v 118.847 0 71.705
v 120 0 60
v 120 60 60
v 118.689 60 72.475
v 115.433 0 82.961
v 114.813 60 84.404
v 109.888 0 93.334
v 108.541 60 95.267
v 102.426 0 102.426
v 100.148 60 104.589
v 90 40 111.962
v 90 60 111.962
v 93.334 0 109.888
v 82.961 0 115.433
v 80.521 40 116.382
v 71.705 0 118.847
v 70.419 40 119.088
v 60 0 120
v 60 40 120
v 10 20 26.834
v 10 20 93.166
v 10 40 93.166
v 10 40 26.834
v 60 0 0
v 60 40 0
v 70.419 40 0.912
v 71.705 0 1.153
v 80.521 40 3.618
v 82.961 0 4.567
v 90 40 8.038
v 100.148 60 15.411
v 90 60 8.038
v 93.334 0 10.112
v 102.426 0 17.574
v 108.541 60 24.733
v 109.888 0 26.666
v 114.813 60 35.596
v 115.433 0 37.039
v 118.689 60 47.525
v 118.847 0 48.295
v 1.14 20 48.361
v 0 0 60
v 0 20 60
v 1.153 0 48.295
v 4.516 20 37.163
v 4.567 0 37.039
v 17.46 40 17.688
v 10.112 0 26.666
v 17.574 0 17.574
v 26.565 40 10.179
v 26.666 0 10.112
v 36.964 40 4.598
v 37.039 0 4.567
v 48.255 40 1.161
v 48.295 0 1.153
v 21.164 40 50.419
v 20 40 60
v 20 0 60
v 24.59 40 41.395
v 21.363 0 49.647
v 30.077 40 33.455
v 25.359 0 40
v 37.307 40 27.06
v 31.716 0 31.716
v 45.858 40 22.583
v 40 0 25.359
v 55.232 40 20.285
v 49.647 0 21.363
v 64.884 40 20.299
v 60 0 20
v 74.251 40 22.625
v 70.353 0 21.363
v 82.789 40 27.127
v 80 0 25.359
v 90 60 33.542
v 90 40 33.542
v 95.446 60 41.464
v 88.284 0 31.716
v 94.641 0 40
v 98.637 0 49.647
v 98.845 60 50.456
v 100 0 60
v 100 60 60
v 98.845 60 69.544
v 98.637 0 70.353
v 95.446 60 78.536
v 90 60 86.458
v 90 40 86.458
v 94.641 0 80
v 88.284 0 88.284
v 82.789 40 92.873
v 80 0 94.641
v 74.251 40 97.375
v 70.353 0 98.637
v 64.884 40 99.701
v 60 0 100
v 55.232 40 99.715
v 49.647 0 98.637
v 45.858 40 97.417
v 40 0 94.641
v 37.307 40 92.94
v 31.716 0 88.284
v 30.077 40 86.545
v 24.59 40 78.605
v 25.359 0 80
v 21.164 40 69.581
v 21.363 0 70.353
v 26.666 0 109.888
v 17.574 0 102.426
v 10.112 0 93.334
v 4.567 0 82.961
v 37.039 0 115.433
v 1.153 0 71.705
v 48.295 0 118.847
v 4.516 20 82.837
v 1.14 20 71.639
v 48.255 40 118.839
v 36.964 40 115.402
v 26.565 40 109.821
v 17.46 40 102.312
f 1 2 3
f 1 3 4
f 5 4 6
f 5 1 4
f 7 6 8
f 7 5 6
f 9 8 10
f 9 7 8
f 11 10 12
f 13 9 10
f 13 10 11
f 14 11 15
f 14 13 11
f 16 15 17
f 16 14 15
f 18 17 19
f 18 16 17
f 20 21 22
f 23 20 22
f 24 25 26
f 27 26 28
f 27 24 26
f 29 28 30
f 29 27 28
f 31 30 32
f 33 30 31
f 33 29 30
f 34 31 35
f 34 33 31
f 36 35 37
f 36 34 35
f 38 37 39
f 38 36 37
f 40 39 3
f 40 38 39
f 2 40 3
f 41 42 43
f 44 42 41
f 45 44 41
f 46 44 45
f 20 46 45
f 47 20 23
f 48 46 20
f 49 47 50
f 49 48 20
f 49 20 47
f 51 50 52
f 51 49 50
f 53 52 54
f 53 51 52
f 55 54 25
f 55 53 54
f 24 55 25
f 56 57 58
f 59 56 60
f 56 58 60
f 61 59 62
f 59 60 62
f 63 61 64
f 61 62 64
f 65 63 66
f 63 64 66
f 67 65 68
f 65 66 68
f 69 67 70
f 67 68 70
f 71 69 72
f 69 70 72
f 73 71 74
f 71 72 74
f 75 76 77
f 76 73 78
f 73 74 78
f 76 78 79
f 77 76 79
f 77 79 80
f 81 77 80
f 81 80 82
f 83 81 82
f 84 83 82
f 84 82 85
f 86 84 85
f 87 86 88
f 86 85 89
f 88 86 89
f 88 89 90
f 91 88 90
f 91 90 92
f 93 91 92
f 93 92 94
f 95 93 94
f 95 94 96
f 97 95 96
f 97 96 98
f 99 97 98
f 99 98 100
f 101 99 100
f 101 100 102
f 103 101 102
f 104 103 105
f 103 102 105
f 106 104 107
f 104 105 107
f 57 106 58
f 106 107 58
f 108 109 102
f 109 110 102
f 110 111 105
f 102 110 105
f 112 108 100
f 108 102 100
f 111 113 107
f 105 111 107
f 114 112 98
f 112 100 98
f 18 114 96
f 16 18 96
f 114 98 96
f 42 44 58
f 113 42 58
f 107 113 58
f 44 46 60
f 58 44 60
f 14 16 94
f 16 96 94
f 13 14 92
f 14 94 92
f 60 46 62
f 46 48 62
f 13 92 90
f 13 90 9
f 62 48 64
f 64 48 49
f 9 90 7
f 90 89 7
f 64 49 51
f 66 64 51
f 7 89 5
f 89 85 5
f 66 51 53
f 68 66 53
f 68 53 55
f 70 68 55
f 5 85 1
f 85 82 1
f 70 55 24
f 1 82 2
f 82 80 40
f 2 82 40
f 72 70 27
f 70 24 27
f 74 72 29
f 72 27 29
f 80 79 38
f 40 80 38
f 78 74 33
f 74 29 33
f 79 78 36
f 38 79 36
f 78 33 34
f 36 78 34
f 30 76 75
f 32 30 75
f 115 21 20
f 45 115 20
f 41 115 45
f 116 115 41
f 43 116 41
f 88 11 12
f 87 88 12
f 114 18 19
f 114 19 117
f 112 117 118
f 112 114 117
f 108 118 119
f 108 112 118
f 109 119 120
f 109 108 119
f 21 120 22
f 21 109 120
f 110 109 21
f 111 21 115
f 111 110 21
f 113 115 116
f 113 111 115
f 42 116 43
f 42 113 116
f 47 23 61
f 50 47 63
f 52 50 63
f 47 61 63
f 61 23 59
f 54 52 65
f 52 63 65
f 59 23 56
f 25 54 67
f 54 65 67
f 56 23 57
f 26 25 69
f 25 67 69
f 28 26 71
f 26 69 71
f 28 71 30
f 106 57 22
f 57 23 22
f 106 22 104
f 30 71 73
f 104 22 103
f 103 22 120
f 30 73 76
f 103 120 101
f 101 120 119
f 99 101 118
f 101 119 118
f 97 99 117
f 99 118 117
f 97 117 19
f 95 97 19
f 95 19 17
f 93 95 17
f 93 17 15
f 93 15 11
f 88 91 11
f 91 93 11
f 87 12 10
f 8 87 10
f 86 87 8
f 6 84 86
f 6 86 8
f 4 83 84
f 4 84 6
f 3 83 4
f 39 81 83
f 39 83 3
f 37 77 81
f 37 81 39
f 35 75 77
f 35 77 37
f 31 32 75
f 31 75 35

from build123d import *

# Parameters (mm, degrees)
SKETCH1_W           = 120
SKETCH1_H           = 60
BOSS_EXTRUDE1_DEPTH = 120
CUT_EXTRUDE1_DEPTH  = 120
CUT_EXTRUDE2_DEPTH  = 120
SKETCH5_R           = 40
CUT_EXTRUDE3_DEPTH  = 120


with BuildPart() as part:
    # Sketch1 → Boss-Extrude1 (new body)
    with BuildSketch(Plane.XY):
        with Locations((60, 30)):
            Rectangle(SKETCH1_W, SKETCH1_H)
    extrude(amount=BOSS_EXTRUDE1_DEPTH)

    # Sketch2 → Cut-Extrude1 (cut)
    with BuildSketch(Plane.XY.offset(120)):
        Polygon((0, 60), (0, 20), (10, 20), (10, 40), (90, 40), (90, 60), align=None)
    extrude(amount=-CUT_EXTRUDE1_DEPTH, mode=Mode.SUBTRACT)

    # Sketch3 → Cut-Extrude2 (cut)
    with BuildSketch(Plane(origin=(0, 0, 0), x_dir=(1, 0, 0), z_dir=(0, 1, 0))):
        with BuildLine():
            Line((120, 0), (60, 0))
            ThreePointArc((60, 0), (102.426406871, -17.573593129), (120, -60))
            Line((120, -60), (120, 0))
        make_face()
        with BuildLine():
            ThreePointArc((0, -60), (17.573593129, -17.573593129), (60, 0))
            Line((60, 0), (0, 0))
            Line((0, 0), (0, -60))
        make_face()
        with BuildLine():
            ThreePointArc((60, -120), (17.573593129, -102.426406871), (0, -60))
            Line((0, -60), (0, -120))
            Line((0, -120), (60, -120))
        make_face()
        with BuildLine():
            Line((120, -120), (120, -60))
            ThreePointArc((120, -60), (102.426406871, -102.426406871), (60, -120))
            Line((60, -120), (120, -120))
        make_face()
    extrude(amount=CUT_EXTRUDE2_DEPTH, mode=Mode.SUBTRACT)

    # Sketch5 → Cut-Extrude3 (cut)
    with BuildSketch(Plane(origin=(0, 0, 0), x_dir=(-1, 0, 0), z_dir=(0, -1, 0))):
        with Locations((-60, -60)):
            Circle(SKETCH5_R)
    extrude(amount=-CUT_EXTRUDE3_DEPTH, mode=Mode.SUBTRACT)


solid = part.part
